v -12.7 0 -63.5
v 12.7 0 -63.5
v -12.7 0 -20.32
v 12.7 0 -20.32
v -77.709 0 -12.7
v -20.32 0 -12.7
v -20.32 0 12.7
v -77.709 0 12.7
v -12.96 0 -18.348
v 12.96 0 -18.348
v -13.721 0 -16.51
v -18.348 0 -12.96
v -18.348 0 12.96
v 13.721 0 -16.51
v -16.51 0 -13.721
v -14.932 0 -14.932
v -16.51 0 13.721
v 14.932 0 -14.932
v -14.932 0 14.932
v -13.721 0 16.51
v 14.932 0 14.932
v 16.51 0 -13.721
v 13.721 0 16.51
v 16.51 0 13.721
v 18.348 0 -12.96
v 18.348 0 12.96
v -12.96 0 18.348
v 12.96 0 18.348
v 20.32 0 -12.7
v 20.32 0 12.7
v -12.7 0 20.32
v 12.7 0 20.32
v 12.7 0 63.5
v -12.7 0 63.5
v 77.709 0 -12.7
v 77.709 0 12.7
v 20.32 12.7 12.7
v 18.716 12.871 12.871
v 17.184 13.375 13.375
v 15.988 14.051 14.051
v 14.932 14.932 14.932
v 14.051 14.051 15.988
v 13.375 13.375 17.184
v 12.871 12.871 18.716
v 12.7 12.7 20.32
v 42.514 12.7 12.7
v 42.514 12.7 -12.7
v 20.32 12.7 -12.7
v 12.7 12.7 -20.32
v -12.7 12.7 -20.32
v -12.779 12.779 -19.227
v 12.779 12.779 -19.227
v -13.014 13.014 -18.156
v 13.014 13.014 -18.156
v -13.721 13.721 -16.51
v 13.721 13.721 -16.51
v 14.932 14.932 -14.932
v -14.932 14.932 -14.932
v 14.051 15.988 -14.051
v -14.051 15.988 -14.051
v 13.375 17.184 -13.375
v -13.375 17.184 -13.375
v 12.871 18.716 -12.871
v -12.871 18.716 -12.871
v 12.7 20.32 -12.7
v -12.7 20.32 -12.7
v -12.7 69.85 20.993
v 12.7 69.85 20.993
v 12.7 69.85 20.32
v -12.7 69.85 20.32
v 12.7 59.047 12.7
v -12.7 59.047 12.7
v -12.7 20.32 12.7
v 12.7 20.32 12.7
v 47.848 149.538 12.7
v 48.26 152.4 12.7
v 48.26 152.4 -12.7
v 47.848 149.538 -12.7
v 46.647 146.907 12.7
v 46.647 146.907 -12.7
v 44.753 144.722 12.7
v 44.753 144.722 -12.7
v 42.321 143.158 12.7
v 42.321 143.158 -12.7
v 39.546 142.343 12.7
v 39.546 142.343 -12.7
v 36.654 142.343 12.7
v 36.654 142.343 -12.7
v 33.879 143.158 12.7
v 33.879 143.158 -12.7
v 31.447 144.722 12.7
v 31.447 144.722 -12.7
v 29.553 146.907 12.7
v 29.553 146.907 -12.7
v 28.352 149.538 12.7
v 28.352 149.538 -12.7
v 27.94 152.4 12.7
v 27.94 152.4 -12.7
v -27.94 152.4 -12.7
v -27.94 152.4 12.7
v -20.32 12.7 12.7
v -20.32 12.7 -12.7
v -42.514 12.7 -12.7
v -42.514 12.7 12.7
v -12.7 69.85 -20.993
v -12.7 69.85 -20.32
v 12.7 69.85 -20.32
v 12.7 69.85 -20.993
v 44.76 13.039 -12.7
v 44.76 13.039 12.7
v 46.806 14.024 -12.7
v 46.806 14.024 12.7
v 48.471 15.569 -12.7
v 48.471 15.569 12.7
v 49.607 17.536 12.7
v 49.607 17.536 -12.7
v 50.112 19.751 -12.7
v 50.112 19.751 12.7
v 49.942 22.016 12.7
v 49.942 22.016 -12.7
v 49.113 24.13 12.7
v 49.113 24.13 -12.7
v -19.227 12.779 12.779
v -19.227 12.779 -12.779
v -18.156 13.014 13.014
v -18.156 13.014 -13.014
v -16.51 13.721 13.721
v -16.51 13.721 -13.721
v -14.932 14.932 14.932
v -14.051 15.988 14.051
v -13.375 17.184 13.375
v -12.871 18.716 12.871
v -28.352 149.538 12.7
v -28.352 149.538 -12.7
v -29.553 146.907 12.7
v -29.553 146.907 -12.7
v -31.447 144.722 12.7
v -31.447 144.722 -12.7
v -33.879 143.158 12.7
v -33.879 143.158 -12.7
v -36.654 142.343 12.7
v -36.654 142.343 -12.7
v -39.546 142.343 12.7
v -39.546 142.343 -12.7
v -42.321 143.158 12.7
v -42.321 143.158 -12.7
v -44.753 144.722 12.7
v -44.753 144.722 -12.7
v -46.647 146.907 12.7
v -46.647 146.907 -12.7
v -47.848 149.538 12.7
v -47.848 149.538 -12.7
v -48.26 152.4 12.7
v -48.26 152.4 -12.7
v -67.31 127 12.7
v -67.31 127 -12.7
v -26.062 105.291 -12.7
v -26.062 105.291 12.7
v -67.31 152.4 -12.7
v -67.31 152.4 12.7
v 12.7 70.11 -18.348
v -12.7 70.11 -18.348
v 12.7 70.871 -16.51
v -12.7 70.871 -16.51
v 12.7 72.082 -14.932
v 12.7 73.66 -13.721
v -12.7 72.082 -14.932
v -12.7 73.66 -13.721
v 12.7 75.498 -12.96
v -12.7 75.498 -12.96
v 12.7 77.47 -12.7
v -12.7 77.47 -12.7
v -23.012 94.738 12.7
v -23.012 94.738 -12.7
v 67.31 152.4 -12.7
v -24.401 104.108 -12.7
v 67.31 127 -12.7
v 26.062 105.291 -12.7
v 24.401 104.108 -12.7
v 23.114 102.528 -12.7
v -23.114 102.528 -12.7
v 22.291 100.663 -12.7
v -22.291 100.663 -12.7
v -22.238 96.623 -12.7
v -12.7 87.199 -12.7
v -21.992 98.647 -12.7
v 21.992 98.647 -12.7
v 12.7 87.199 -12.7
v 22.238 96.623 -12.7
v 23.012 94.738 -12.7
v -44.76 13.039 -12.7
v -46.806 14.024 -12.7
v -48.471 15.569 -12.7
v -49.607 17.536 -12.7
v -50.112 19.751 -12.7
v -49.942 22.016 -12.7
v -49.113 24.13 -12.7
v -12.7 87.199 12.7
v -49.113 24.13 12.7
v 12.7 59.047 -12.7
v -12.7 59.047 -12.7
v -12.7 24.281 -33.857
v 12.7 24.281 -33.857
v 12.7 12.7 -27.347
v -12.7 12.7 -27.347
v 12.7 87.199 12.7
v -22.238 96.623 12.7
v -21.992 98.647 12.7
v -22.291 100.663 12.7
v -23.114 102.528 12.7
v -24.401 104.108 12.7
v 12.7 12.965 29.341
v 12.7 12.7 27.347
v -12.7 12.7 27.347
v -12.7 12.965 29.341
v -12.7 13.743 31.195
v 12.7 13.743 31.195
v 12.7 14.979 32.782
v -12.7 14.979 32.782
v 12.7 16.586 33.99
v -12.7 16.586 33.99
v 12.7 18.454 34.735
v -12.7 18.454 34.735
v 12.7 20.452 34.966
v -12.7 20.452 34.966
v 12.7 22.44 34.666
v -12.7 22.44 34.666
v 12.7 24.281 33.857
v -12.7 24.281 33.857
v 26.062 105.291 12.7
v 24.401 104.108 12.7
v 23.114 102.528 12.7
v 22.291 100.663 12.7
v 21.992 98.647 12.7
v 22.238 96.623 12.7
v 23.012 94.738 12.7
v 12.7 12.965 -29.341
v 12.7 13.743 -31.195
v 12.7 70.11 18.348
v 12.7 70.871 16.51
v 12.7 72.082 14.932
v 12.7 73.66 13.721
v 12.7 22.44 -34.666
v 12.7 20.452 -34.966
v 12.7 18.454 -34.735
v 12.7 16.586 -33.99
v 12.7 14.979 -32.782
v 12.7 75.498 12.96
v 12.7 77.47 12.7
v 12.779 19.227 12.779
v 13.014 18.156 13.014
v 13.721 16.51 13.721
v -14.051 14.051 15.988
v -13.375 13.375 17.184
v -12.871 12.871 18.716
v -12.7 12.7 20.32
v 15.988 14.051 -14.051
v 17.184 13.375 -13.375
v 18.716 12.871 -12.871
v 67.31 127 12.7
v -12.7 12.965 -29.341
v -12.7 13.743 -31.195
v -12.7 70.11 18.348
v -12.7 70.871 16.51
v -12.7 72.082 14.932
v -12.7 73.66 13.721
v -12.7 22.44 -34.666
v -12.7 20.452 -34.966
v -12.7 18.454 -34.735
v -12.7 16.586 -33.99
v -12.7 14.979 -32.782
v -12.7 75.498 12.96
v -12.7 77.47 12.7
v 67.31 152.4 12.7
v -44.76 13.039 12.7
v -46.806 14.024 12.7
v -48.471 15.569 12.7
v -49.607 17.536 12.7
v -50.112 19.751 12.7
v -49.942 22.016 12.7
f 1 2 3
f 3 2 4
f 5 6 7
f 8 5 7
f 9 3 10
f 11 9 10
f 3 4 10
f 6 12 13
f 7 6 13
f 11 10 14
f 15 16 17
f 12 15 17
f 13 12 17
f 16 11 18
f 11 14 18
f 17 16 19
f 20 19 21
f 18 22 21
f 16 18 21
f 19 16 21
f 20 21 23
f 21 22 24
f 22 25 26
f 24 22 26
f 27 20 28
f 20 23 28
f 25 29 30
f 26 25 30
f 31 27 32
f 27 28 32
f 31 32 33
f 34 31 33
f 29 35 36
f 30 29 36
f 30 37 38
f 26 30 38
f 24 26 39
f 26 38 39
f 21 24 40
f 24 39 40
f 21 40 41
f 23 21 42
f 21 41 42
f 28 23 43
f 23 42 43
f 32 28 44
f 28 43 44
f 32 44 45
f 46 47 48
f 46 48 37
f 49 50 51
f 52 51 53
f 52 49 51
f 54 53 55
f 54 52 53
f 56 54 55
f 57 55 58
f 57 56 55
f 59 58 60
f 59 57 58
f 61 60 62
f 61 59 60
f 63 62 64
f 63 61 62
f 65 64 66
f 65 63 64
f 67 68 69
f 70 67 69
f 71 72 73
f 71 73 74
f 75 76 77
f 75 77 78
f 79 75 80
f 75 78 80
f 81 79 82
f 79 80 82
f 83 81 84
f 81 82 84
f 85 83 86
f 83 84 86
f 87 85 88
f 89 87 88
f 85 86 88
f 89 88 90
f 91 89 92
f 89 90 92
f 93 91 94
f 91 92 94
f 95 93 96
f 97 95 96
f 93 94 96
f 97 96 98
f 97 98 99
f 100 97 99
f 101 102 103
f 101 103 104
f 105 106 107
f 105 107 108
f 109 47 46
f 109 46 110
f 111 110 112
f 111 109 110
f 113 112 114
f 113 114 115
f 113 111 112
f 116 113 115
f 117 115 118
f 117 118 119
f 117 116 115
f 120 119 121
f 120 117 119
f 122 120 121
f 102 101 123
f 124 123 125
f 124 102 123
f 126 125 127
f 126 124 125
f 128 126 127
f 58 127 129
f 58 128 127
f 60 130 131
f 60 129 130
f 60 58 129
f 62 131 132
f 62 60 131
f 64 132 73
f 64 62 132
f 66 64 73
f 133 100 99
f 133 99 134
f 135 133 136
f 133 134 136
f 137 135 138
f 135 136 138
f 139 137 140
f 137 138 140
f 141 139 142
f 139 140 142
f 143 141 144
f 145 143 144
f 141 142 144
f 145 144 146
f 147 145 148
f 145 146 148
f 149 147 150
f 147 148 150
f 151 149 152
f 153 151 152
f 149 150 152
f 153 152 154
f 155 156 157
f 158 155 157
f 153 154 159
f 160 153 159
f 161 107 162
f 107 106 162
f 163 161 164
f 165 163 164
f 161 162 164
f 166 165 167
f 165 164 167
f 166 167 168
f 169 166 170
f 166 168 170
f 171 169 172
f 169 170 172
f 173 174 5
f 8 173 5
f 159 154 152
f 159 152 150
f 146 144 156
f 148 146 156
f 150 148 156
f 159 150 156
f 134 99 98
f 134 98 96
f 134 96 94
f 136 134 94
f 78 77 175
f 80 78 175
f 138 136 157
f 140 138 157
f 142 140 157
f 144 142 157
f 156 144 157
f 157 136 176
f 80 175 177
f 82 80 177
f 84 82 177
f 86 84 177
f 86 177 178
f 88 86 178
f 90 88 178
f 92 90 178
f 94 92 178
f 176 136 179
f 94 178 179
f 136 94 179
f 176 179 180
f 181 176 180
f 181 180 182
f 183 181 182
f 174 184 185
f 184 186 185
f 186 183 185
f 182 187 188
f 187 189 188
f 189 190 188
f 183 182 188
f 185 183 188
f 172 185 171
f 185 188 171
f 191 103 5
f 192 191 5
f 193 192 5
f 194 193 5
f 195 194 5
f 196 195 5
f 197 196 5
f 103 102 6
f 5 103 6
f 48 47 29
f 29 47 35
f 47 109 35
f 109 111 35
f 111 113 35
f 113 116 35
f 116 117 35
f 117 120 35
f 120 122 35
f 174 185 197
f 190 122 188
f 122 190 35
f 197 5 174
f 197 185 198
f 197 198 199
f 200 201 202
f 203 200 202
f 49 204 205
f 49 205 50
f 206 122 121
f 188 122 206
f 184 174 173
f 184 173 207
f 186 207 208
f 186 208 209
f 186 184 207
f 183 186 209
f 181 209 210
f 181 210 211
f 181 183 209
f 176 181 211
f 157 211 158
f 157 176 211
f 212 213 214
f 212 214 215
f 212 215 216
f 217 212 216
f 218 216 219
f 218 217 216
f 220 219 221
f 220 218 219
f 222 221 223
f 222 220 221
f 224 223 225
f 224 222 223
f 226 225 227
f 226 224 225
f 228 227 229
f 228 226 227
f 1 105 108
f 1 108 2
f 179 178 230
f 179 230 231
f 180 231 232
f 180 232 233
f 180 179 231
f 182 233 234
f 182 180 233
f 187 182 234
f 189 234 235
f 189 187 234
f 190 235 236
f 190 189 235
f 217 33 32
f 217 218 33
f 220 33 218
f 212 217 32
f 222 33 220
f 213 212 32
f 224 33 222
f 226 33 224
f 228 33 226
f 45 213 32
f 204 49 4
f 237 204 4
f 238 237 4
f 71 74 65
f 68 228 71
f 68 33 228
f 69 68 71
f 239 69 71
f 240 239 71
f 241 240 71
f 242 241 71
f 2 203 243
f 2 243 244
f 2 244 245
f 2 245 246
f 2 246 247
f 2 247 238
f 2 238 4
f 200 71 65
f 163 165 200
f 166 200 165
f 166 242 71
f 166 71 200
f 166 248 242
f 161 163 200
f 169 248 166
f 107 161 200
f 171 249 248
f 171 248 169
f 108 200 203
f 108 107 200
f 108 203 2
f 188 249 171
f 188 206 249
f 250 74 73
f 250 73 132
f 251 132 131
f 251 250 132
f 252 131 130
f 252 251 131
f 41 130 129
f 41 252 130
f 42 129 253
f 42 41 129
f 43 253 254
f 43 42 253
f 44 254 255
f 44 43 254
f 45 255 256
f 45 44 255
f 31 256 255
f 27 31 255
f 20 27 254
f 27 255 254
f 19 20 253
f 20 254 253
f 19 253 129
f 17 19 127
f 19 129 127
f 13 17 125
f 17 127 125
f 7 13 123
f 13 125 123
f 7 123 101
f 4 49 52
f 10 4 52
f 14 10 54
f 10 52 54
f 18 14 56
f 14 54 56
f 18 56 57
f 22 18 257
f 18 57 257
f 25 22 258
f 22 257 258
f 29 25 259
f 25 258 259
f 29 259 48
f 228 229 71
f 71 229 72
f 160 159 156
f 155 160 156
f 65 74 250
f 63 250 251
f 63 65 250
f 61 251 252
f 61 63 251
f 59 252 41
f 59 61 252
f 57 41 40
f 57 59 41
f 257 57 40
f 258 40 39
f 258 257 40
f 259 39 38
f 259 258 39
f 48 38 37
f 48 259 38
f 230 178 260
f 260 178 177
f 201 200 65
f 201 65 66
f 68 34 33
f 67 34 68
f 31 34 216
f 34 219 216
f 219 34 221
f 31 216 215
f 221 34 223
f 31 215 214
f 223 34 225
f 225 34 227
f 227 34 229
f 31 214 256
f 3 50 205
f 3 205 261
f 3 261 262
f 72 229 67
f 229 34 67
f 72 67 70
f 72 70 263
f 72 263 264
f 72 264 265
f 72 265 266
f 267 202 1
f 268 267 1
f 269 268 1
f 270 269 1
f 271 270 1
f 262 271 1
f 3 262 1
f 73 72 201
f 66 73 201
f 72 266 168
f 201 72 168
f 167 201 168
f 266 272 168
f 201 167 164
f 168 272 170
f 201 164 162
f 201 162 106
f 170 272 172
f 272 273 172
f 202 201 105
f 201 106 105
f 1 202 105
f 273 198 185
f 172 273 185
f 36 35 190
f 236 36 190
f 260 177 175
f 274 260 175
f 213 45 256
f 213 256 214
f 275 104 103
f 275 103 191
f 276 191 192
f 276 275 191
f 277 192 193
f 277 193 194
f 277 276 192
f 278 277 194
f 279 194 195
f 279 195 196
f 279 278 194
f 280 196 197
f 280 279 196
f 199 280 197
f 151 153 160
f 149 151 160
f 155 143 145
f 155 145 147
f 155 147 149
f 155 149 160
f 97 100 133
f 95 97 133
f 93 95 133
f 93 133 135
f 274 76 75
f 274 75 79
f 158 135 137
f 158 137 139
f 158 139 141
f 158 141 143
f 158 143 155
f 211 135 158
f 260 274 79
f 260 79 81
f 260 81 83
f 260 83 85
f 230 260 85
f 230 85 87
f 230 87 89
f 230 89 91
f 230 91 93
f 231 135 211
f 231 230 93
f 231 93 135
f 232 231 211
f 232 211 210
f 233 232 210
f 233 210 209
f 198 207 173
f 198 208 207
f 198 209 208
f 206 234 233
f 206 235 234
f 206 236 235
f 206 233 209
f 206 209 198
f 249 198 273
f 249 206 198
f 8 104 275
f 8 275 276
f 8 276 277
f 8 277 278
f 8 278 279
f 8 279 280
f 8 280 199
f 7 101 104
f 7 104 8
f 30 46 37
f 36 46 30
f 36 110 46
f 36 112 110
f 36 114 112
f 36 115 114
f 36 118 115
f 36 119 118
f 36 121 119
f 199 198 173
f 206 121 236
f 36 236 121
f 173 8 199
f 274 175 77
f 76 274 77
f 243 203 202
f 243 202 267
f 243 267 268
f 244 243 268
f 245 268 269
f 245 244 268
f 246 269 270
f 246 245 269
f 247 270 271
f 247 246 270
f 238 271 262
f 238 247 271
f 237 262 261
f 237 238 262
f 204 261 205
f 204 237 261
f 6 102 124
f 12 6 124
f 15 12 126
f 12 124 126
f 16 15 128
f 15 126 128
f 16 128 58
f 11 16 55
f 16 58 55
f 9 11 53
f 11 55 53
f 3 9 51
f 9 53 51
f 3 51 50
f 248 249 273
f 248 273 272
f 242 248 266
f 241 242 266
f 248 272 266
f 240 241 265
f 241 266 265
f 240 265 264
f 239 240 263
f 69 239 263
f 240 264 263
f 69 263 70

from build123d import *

# Parameters (mm, degrees)
BOSS_EXTRUDE1_DEPTH      = 12.7
BOSS_EXTRUDE1_DEPTH_BACK = 12.7
BOSS_EXTRUDE2_DEPTH      = 12.7
BOSS_EXTRUDE2_DEPTH_BACK = 12.7
FILLET1_R                = 7.62
FILLET2_R                = 7.62
FILLET3_R                = 7.62


with BuildPart() as part:
    # Sketch1 → Boss-Extrude1 (new, two sides: drawn at the far end of the back side and taken through both)
    with BuildSketch(Plane.XY.offset(-BOSS_EXTRUDE1_DEPTH_BACK)):
        with BuildLine():
            Line((27.94, 152.4), (-27.94, 152.4))
            ThreePointArc((-27.94, 152.4), (-38.1, 142.24), (-48.26, 152.4))
            Line((-48.26, 152.4), (-67.31, 152.4))
            Line((-67.31, 152.4), (-67.31, 127))
            Line((-67.31, 127), (-19.05, 101.6))
            Line((-19.05, 101.6), (-77.70878735, 0))
            Line((-77.70878735, 0), (77.70878735, 0))
            Line((77.70878735, 0), (19.05, 101.6))
            Line((19.05, 101.6), (67.31, 127))
            Line((67.31, 127), (67.31, 152.4))
            Line((67.31, 152.4), (48.26, 152.4))
            ThreePointArc((48.26, 152.4), (38.1, 142.24), (27.94, 152.4))
        make_face()
        Polygon((-55.711742094, 12.7), (-12.7, 12.7), (-12.7, 87.198522628), align=None, mode=Mode.SUBTRACT)
        Polygon((12.7, 87.198522628), (12.7, 12.7), (55.711742094, 12.7), align=None, mode=Mode.SUBTRACT)
    extrude(amount=BOSS_EXTRUDE1_DEPTH + BOSS_EXTRUDE1_DEPTH_BACK)

    # Sketch2 → Boss-Extrude2 (add, two sides: drawn at the far end of the back side and taken through both)
    with BuildSketch(Plane(origin=(0, 0, 0), x_dir=(0, 0, -1), z_dir=(1, 0, 0)).offset(-BOSS_EXTRUDE2_DEPTH_BACK)):
        Polygon((20.992545931, 69.85), (63.5, 0), (-63.5, 0), (-20.992545931, 69.85), align=None)
        Polygon((12.7, 59.046917663), (40.904573712, 12.7), (12.7, 12.7), align=None, mode=Mode.SUBTRACT)
        Polygon((-12.7, 59.046917663), (-12.7, 12.7), (-40.904573712, 12.7), align=None, mode=Mode.SUBTRACT)
    extrude(amount=BOSS_EXTRUDE2_DEPTH + BOSS_EXTRUDE2_DEPTH_BACK)

    # Fillet1
    fillet1_edges = [part.edges().sort_by_distance(p)[0] for p in [
        (0, 69.85, -12.7),
        (0, 69.85, 12.7),
    ]]
    fillet(fillet1_edges, radius=FILLET1_R)

    # Fillet2
    # the kernel refuses this fillet: 7.62 mm, written as the material it adds along each edge
    with BuildSketch(Plane(origin=(12.7, 12.7, -12.7), x_dir=(0, 0, -1), z_dir=(0, -1, 0)), Plane(origin=(12.7, 12.7, 12.7), x_dir=(1, 0, 0), z_dir=(0, -1, 0))) as fillet2_piece_1:
        with BuildLine():
            CenterArc((FILLET2_R, FILLET2_R), FILLET2_R, 180, 90)
            Line((0, FILLET2_R), (0, 0))
            Line((0, 0), (FILLET2_R, 0))
        make_face()
    extrude(amount=12.7)
    with BuildSketch(Plane(origin=(-12.7, 12.7, -12.7), x_dir=(0, 0, -1), z_dir=(0, -1, 0)), Plane(origin=(-12.7, 12.7, 12.7), x_dir=(-1, 0, 0), z_dir=(0, -1, 0))) as fillet2_piece_2:
        with BuildLine():
            CenterArc((FILLET2_R, -FILLET2_R), FILLET2_R, 90, 90)
            Line((0, -FILLET2_R), (0, 0))
            Line((0, 0), (FILLET2_R, 0))
        make_face()
    extrude(amount=12.7)
    with BuildSketch(Plane(origin=(12.7, 12.7, -40.904573712), x_dir=(0, 0, 1), z_dir=(-1, 0, 0)), Plane(origin=(12.7, 12.7, 40.904573712), x_dir=(0, 0.8542525273339658, -0.5198582687074736), z_dir=(-1, 0, 0))) as fillet2_piece_3:
        with BuildLine():
            CenterArc((FILLET2_R * 1.77916742424, FILLET2_R), FILLET2_R, 148.677255076, 121.322744924)
            Line((FILLET2_R * 0.924914896906, FILLET2_R * 1.51985826871), (0, 0))
            Line((0, 0), (FILLET2_R * 1.77916742424, 0))
        make_face()
    extrude(amount=25.4)
    with BuildSketch(Plane(origin=(19.05, 101.6, -12.7), x_dir=(0.4999999999999972, -0.8660254037844403, 0), z_dir=(0, 0, 1))) as fillet2_piece_4:
        with BuildLine():
            CenterArc((FILLET2_R * 1.03990652475, FILLET2_R), FILLET2_R, 177.758540601, 92.241459399)
            Line((FILLET2_R * 0.0406716474833, FILLET2_R * 1.03911086864), (0, 0))
            Line((0, 0), (FILLET2_R * 1.03990652475, 0))
        make_face()
    extrude(amount=25.4)
    with BuildSketch(Plane(origin=(-19.05, 101.6, -12.7), x_dir=(-0.4999999999999979, -0.8660254037844399, 0), z_dir=(0, 0, 1))) as fillet2_piece_5:
        with BuildLine():
            CenterArc((FILLET2_R * 1.03990652475, -FILLET2_R), FILLET2_R, 90, 92.241459399)
            Line((FILLET2_R * 0.0406716474833, -FILLET2_R * 1.03911086864), (0, 0))
            Line((0, 0), (FILLET2_R * 1.03990652475, 0))
        make_face()
    extrude(amount=25.4)
    with BuildSketch(Plane(origin=(-55.711742094, 12.7, 12.7), x_dir=(0.49999999999999845, 0.8660254037844396, 0), z_dir=(0, 0, -1)), Plane(origin=(55.711742094, 12.7, -12.7), x_dir=(-0.4999999999999981, 0.8660254037844397, 0), z_dir=(0, 0, 1))) as fillet2_piece_6:
        with BuildLine():
            CenterArc((FILLET2_R * 1.73205080757, FILLET2_R), FILLET2_R, 150, 120)
            Line((FILLET2_R * 0.866025403784, FILLET2_R * 1.5), (0, 0))
            Line((0, 0), (FILLET2_R * 1.73205080757, 0))
        make_face()
    extrude(amount=25.4)

    # Fillet3
    # the kernel refuses this fillet: 7.62 mm, written as the material it adds along each edge
    with BuildSketch(Plane(origin=(12.7, 12.7, -12.7), x_dir=(1, 0, 0), z_dir=(0, 0, 1)), Plane(origin=(12.7, 12.7, 12.7), x_dir=(0, 0, 1), z_dir=(-1, 0, 0))) as fillet3_piece_1:
        with BuildLine():
            CenterArc((FILLET3_R, FILLET3_R), FILLET3_R, 180, 90)
            Line((0, FILLET3_R), (0, 0))
            Line((0, 0), (FILLET3_R, 0))
        make_face()
    extrude(amount=25.4)
    with BuildSketch(Plane(origin=(12.7, 12.7, -12.7), x_dir=(0, 0, -1), z_dir=(-1, 0, 0)), Plane(origin=(-12.7, 12.7, -12.7), x_dir=(-1, 0, 0), z_dir=(0, 0, 1))) as fillet3_piece_2:
        with BuildLine():
            CenterArc((FILLET3_R, -FILLET3_R), FILLET3_R, 90, 90)
            Line((0, -FILLET3_R), (0, 0))
            Line((0, 0), (FILLET3_R, 0))
        make_face()
    extrude(amount=25.4)
    with BuildSketch(Plane(origin=(31.75, 12.7, -12.7), x_dir=(0, 0, -1), z_dir=(-1, 0, 0))) as fillet3_piece_3a_section:
        with BuildLine():
            CenterArc((FILLET3_R, -FILLET3_R), FILLET3_R, 90, 90)
            Line((0, -FILLET3_R), (0, 0))
            Line((0, 0), (FILLET3_R, 0))
        make_face()
    fillet3_piece_3a = extrude(amount=44.45, mode=Mode.PRIVATE)
    fillet3_piece_3a = split(fillet3_piece_3a, bisect_by=Plane(origin=(12.7, 14.893212432, -14.893212432), z_dir=(1, 0, 0)), keep=Keep.TOP, mode=Mode.PRIVATE)
    fillet3_piece_3a = fillet3_piece_3a - Plane(origin=(20.32, 14.893212432, -20.32), x_dir=(0, 0, -1), z_dir=(0, 1, 0)) * Cylinder(7.62, 120, mode=Mode.PRIVATE)
    with BuildSketch(Plane(origin=(12.7, 12.7, -31.75), x_dir=(1, 0, 0), z_dir=(0, 0, 1))) as fillet3_piece_3b_section:
        with BuildLine():
            CenterArc((FILLET3_R, FILLET3_R), FILLET3_R, 180, 90)
            Line((0, FILLET3_R), (0, 0))
            Line((0, 0), (FILLET3_R, 0))
        make_face()
    fillet3_piece_3b = extrude(amount=44.45, mode=Mode.PRIVATE)
    fillet3_piece_3b = fillet3_piece_3b - Plane(origin=(20.32, 13.018424072, -20.32), x_dir=(0, 0, -1), z_dir=(0, 1, 0)) * Cylinder(7.62, 120, mode=Mode.PRIVATE)
    fillet3_piece_3b = split(fillet3_piece_3b, bisect_by=Plane(origin=(17.997172091, 13.018424072, -12.7), z_dir=(0, 0, -1)), keep=Keep.TOP, mode=Mode.PRIVATE)
    fillet3_piece_3b = fillet3_piece_3b - Plane(origin=(17.997172091, 20.32, -27.347317939), x_dir=(0, 0, 1), z_dir=(1, 0, 0)) * Cylinder(7.62, 120, mode=Mode.PRIVATE)
    fillet3_piece_3 = fillet3_piece_3a & fillet3_piece_3b
    add(fillet3_piece_3)
    with BuildSketch(Plane(origin=(31.75, 12.7, 12.7), x_dir=(0, 0, 1), z_dir=(-1, 0, 0))) as fillet3_piece_4a_section:
        with BuildLine():
            CenterArc((FILLET3_R, FILLET3_R), FILLET3_R, 180, 90)
            Line((0, FILLET3_R), (0, 0))
            Line((0, 0), (FILLET3_R, 0))
        make_face()
    fillet3_piece_4a = extrude(amount=44.45, mode=Mode.PRIVATE)
    fillet3_piece_4a = fillet3_piece_4a - Plane(origin=(20.32, 14.893212432, 20.32), x_dir=(1, 0, 0), z_dir=(0, 1, 0)) * Cylinder(7.62, 120, mode=Mode.PRIVATE)
    fillet3_piece_4a = split(fillet3_piece_4a, bisect_by=Plane(origin=(12.7, 14.893212432, 14.893212432), z_dir=(1, 0, 0)), keep=Keep.TOP, mode=Mode.PRIVATE)
    with BuildSketch(Plane(origin=(12.7, 12.7, -12.7), x_dir=(1, 0, 0), z_dir=(0, 0, 1))) as fillet3_piece_4b_section:
        with BuildLine():
            CenterArc((FILLET3_R, FILLET3_R), FILLET3_R, 180, 90)
            Line((0, FILLET3_R), (0, 0))
            Line((0, 0), (FILLET3_R, 0))
        make_face()
    fillet3_piece_4b = extrude(amount=44.45, mode=Mode.PRIVATE)
    fillet3_piece_4b = split(fillet3_piece_4b, bisect_by=Plane(origin=(14.346750692, 12.818924561, 12.7), z_dir=(0, 0, 1)), keep=Keep.TOP, mode=Mode.PRIVATE)
    fillet3_piece_4b = fillet3_piece_4b - Plane(origin=(20.32, 12.818924561, 20.32), x_dir=(1, 0, 0), z_dir=(0, 1, 0)) * Cylinder(7.62, 120, mode=Mode.PRIVATE)
    fillet3_piece_4b = fillet3_piece_4b - Plane(origin=(14.346750692, 20.32, 27.347317939), x_dir=(0, 0.8542525273341854, -0.5198582687071128), z_dir=(1, 0, 0)) * Cylinder(7.62, 120, mode=Mode.PRIVATE)
    fillet3_piece_4 = fillet3_piece_4a & fillet3_piece_4b
    add(fillet3_piece_4)
    with BuildSketch(Plane(origin=(-12.7, 12.7, -31.75), x_dir=(-1, 0, 0), z_dir=(0, 0, 1))) as fillet3_piece_5a_section:
        with BuildLine():
            CenterArc((FILLET3_R, -FILLET3_R), FILLET3_R, 90, 90)
            Line((0, -FILLET3_R), (0, 0))
            Line((0, 0), (FILLET3_R, 0))
        make_face()
    fillet3_piece_5a = extrude(amount=44.45, mode=Mode.PRIVATE)
    fillet3_piece_5a = split(fillet3_piece_5a, bisect_by=Plane(origin=(-17.997172063, 13.018423982, -12.7), z_dir=(0, 0, -1)), keep=Keep.TOP, mode=Mode.PRIVATE)
    fillet3_piece_5a = fillet3_piece_5a - Plane(origin=(-20.32, 13.018423982, -20.32), x_dir=(0, 0, -1), z_dir=(0, 1, 0)) * Cylinder(7.62, 120, mode=Mode.PRIVATE)
    fillet3_piece_5a = fillet3_piece_5a - Plane(origin=(-17.997172063, 20.32, -27.347317939), x_dir=(0, 0, 1), z_dir=(1, 0, 0)) * Cylinder(7.62, 120, mode=Mode.PRIVATE)
    with BuildSketch(Plane(origin=(12.7, 12.7, -12.7), x_dir=(0, 0, -1), z_dir=(-1, 0, 0))) as fillet3_piece_5b_section:
        with BuildLine():
            CenterArc((FILLET3_R, -FILLET3_R), FILLET3_R, 90, 90)
            Line((0, -FILLET3_R), (0, 0))
            Line((0, 0), (FILLET3_R, 0))
        make_face()
    fillet3_piece_5b = extrude(amount=44.45, mode=Mode.PRIVATE)
    fillet3_piece_5b = fillet3_piece_5b - Plane(origin=(-20.32, 20.265363421, -20.32), x_dir=(0, 0, -1), z_dir=(0, 1, 0)) * Cylinder(7.62, 120, mode=Mode.PRIVATE)
    fillet3_piece_5b = split(fillet3_piece_5b, bisect_by=Plane(origin=(-12.7, 20.265363421, -12.6238), z_dir=(-1, 0, 0)), keep=Keep.TOP, mode=Mode.PRIVATE)
    fillet3_piece_5 = fillet3_piece_5a & fillet3_piece_5b
    add(fillet3_piece_5)
    with BuildSketch(Plane(origin=(-12.7, 12.7, -12.7), x_dir=(-1, 0, 0), z_dir=(0, 0, 1))) as fillet3_piece_6a_section:
        with BuildLine():
            CenterArc((FILLET3_R, -FILLET3_R), FILLET3_R, 90, 90)
            Line((0, -FILLET3_R), (0, 0))
            Line((0, 0), (FILLET3_R, 0))
        make_face()
    fillet3_piece_6a = extrude(amount=44.45, mode=Mode.PRIVATE)
    fillet3_piece_6a = fillet3_piece_6a - Plane(origin=(-20.32, 16.148179969, 20.32), x_dir=(-1, 0, 0), z_dir=(0, 1, 0)) * Cylinder(7.62, 120, mode=Mode.PRIVATE)
    fillet3_piece_6a = split(fillet3_piece_6a, bisect_by=Plane(origin=(-12.657850187, 16.148179969, 12.7), z_dir=(0, 0, 1)), keep=Keep.TOP, mode=Mode.PRIVATE)
    fillet3_piece_6a = fillet3_piece_6a - Plane(origin=(-12.657850187, 20.32, 27.347317939), x_dir=(0, 0.8542525273341854, -0.5198582687071128), z_dir=(1, 0, 0)) * Cylinder(7.62, 120, mode=Mode.PRIVATE)
    with BuildSketch(Plane(origin=(12.7, 12.7, 12.7), x_dir=(0, 0, 1), z_dir=(-1, 0, 0))) as fillet3_piece_6b_section:
        with BuildLine():
            CenterArc((FILLET3_R, FILLET3_R), FILLET3_R, 180, 90)
            Line((0, FILLET3_R), (0, 0))
            Line((0, 0), (FILLET3_R, 0))
        make_face()
    fillet3_piece_6b = extrude(amount=44.45, mode=Mode.PRIVATE)
    fillet3_piece_6b = split(fillet3_piece_6b, bisect_by=Plane(origin=(-12.7, 20.265363421, 12.6238), z_dir=(-1, 0, 0)), keep=Keep.TOP, mode=Mode.PRIVATE)
    fillet3_piece_6b = fillet3_piece_6b - Plane(origin=(-20.32, 20.265363421, 20.32), x_dir=(-1, 0, 0), z_dir=(0, 1, 0)) * Cylinder(7.62, 120, mode=Mode.PRIVATE)
    fillet3_piece_6 = fillet3_piece_6a & fillet3_piece_6b
    add(fillet3_piece_6)


solid = part.part
